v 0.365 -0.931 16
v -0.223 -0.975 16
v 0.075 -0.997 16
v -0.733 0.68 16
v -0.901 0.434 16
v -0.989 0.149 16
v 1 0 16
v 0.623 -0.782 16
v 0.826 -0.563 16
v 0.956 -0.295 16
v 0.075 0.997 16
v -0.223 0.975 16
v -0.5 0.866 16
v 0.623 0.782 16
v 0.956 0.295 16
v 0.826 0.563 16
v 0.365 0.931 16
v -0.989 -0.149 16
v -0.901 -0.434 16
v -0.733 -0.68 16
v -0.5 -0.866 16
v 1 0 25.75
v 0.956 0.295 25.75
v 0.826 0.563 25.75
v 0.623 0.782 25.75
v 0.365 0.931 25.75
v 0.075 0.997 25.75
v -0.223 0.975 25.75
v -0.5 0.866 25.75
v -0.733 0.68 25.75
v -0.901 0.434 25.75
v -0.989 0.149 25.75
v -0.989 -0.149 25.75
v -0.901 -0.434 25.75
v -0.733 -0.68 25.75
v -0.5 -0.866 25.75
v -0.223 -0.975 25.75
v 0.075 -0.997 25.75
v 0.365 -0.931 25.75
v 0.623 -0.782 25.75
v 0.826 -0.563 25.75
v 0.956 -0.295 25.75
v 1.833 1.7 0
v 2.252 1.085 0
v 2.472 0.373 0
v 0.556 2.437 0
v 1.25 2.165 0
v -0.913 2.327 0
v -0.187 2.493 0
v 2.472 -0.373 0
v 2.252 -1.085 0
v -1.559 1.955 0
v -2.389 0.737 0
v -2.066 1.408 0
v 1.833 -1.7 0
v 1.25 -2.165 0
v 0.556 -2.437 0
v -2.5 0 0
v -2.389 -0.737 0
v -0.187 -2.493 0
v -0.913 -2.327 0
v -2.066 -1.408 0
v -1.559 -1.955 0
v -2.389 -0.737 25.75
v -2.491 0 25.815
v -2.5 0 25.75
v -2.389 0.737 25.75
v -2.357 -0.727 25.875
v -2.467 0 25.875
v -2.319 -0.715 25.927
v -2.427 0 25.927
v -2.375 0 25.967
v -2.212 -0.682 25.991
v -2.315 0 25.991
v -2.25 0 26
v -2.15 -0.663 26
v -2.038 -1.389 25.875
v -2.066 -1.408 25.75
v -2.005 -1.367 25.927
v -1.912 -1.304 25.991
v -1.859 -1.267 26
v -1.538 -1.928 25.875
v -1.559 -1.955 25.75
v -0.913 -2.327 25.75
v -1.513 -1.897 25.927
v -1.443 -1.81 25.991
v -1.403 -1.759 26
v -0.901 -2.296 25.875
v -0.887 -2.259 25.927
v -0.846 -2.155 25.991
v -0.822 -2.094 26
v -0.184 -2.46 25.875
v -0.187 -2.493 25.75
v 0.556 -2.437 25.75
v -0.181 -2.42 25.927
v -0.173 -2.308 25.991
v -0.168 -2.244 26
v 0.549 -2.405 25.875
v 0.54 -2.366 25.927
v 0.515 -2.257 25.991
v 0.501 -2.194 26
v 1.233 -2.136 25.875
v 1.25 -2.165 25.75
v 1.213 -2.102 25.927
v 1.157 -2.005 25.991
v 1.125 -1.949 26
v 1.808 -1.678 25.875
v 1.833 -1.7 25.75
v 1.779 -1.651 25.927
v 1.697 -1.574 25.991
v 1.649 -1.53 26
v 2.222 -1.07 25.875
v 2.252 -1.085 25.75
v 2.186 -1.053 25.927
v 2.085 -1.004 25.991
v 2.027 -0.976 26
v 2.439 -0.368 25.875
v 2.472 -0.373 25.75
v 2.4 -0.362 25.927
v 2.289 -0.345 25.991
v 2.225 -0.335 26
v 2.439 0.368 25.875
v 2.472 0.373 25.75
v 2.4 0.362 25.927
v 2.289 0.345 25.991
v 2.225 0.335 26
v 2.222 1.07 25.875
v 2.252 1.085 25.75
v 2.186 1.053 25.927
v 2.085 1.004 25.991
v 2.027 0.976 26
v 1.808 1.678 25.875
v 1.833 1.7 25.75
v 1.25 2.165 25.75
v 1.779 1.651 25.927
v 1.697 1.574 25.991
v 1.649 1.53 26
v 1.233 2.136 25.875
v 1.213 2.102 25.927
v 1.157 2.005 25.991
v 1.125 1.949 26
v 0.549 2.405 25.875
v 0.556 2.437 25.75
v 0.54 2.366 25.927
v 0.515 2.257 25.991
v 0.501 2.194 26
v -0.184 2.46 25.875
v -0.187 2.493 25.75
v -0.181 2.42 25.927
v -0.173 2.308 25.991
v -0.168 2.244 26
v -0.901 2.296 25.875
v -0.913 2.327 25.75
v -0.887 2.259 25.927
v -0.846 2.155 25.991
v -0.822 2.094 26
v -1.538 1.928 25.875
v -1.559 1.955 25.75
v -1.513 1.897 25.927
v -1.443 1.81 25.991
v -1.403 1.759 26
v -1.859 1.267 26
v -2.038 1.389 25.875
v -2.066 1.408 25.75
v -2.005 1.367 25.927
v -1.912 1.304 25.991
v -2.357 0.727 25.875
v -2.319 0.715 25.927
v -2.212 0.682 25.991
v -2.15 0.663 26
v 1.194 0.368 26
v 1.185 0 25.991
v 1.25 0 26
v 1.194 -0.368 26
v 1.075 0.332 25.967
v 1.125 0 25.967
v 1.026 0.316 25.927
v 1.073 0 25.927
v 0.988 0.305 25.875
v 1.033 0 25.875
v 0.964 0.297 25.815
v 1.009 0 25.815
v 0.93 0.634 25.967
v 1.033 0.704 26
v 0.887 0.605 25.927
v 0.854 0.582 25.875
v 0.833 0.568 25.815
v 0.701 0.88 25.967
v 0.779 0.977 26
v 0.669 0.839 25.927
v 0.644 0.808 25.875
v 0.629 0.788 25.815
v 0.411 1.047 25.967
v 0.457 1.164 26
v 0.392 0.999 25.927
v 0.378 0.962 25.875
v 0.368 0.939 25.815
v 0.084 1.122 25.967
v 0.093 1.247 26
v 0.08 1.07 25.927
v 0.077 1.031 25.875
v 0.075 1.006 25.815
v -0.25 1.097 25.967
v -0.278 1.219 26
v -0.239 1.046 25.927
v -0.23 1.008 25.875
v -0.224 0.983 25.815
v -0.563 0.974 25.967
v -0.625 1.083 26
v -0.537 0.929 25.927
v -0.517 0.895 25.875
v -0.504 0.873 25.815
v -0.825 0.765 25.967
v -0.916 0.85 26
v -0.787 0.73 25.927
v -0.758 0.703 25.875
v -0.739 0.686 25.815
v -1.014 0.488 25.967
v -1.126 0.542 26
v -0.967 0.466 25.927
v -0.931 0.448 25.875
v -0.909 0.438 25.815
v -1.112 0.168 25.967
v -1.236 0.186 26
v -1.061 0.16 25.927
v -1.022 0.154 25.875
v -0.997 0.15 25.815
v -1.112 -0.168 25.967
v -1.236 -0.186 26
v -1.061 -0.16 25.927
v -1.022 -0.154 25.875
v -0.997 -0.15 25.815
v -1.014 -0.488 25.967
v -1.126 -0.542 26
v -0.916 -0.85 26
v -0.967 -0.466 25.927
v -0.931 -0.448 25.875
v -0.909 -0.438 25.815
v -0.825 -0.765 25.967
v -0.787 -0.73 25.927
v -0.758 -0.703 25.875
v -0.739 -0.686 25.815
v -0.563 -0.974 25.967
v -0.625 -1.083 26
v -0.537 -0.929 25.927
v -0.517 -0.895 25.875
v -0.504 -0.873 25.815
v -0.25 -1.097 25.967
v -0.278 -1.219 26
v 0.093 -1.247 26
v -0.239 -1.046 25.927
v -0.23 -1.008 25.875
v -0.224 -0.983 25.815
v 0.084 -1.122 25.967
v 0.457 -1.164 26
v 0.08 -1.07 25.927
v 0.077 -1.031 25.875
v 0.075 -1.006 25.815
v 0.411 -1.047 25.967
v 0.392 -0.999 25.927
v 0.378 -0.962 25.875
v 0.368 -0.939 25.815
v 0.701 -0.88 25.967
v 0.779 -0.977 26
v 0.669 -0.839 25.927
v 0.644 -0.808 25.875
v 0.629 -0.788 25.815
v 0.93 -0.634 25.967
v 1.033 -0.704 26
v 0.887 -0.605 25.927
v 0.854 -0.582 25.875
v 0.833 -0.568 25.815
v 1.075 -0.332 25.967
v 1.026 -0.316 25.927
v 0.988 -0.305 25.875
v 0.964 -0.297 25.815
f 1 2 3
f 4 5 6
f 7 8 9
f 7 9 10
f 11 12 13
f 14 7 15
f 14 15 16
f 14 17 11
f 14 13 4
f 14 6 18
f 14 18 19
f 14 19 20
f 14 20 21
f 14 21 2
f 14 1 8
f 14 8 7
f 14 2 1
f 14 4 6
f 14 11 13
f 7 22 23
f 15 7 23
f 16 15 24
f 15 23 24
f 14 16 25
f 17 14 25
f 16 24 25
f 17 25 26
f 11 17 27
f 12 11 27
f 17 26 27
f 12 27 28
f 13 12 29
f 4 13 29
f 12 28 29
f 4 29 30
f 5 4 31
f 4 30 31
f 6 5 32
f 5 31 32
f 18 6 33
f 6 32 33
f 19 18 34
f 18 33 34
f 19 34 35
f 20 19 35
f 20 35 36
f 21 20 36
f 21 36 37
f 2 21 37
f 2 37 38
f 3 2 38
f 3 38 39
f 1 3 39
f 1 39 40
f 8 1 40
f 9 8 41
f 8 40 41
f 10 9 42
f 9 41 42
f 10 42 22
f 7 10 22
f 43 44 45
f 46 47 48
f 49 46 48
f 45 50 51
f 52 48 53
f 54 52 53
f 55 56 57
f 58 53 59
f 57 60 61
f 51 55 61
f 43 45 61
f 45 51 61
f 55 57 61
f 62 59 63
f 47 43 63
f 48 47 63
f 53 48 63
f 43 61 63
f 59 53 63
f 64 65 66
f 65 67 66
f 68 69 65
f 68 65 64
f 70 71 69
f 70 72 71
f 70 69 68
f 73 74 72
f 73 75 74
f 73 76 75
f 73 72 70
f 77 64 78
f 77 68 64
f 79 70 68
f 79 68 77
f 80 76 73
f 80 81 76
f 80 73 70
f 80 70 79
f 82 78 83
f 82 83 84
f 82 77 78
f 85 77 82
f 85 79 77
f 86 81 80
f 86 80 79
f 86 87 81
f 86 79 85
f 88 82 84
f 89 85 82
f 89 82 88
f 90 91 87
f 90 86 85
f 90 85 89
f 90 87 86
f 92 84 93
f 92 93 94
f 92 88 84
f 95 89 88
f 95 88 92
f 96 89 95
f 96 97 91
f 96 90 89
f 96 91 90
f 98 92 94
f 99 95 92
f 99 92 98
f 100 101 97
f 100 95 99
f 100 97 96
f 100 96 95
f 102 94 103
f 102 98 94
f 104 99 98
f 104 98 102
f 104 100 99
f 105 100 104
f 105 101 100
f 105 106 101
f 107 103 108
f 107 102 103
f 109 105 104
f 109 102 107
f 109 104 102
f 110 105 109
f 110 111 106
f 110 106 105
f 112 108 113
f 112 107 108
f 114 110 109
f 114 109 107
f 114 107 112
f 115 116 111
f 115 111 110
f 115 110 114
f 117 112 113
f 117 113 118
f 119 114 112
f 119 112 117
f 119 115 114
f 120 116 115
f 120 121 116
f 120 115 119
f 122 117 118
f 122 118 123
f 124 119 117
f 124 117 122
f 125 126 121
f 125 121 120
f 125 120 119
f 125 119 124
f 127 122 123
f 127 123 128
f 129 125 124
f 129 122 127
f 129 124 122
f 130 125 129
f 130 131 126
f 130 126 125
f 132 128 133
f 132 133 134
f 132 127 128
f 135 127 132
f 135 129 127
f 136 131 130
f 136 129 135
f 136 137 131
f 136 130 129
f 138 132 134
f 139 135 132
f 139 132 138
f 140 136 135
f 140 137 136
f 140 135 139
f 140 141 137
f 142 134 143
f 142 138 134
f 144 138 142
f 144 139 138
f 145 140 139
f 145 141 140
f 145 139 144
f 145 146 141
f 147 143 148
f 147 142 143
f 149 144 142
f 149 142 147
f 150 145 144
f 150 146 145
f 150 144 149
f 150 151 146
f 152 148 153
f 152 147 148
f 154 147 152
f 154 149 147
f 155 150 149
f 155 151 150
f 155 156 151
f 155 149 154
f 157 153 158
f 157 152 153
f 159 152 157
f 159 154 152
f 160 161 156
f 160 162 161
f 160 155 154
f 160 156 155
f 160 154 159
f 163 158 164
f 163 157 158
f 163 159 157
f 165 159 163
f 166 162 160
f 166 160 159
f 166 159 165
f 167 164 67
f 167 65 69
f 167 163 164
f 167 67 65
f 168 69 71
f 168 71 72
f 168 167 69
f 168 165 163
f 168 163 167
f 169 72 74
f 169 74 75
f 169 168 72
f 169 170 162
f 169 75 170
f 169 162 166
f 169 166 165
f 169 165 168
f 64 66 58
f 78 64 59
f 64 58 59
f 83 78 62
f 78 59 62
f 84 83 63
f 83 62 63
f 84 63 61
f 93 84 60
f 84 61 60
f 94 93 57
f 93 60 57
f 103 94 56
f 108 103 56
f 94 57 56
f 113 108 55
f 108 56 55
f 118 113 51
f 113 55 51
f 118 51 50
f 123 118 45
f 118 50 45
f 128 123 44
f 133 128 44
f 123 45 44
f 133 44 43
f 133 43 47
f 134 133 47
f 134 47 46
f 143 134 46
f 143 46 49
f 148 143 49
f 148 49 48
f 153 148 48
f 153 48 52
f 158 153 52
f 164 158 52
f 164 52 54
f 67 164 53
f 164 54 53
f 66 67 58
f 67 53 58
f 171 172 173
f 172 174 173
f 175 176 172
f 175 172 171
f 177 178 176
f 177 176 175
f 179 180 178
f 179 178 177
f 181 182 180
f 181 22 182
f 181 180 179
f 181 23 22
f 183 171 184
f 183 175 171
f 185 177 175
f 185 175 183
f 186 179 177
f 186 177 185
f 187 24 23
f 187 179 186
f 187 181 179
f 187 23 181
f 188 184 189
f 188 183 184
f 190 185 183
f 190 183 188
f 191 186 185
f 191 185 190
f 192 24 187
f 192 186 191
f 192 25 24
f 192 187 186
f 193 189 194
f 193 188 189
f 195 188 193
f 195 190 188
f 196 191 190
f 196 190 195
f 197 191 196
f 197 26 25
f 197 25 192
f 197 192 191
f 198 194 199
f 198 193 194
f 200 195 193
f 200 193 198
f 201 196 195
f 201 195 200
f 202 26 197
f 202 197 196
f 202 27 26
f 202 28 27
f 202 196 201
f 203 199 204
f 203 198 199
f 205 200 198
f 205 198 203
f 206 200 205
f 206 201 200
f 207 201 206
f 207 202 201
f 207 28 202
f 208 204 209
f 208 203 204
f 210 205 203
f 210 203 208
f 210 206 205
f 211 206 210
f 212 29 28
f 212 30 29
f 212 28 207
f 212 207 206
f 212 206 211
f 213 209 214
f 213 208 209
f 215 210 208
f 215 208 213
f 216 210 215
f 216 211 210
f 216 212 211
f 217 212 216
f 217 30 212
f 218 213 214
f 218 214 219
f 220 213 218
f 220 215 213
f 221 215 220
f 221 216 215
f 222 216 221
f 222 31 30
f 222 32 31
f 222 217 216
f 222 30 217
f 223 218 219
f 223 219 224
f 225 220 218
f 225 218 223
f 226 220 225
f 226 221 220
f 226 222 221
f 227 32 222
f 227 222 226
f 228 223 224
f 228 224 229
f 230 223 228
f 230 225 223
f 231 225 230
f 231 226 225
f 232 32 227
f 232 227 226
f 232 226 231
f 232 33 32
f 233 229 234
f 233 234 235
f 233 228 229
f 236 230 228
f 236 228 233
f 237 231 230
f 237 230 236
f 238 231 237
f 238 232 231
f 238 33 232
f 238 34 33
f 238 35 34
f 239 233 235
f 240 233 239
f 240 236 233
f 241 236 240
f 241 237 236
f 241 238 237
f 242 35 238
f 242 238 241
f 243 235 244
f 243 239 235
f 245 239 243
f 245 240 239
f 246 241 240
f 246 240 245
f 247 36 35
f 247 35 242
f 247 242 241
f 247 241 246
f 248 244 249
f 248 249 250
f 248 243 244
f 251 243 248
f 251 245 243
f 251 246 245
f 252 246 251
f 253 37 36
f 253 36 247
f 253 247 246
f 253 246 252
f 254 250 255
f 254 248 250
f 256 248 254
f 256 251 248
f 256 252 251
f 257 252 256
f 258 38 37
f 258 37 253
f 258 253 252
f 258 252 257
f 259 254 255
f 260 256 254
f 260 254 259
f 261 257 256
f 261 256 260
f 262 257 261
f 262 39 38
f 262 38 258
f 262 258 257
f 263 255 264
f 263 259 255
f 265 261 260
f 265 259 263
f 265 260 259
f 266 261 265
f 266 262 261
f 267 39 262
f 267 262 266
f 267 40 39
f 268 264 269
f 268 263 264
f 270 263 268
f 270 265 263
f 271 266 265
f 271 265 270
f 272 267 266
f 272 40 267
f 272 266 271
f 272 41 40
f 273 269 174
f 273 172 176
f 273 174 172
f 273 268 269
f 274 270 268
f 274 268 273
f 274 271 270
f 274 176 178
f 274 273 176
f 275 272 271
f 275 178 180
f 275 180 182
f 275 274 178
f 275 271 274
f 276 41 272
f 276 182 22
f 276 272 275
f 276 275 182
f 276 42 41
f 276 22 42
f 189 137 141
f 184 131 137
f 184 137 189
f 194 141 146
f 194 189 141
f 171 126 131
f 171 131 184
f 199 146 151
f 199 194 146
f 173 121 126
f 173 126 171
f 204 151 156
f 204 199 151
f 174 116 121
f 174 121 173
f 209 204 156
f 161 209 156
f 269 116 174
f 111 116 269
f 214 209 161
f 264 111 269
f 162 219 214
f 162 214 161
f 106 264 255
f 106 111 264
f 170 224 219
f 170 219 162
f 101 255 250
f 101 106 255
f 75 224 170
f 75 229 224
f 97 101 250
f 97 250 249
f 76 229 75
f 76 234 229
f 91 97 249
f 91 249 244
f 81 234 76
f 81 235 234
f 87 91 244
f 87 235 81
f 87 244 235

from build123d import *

# Parameters (mm, degrees)
CROQUIS1_R              = 2.5
SALIENTE_EXTRUIR1_DEPTH = 26
CROQUIS2_R              = 1
CORTAR_EXTRUIR1_DEPTH   = 10
REDONDEO1_R             = 0.25


with BuildPart() as part:
    # Croquis1 → Saliente-Extruir1 (new body)
    with BuildSketch(Plane.XY):
        with Locations(Location((0, 0, 0), (0, 0, 180))):
            Circle(CROQUIS1_R)
    extrude(amount=SALIENTE_EXTRUIR1_DEPTH)

    # Croquis2 → Cortar-Extruir1 (cut)
    with BuildSketch(Plane.XY.offset(26)):
        Circle(CROQUIS2_R)
    extrude(amount=-CORTAR_EXTRUIR1_DEPTH, mode=Mode.SUBTRACT)

    # Redondeo1
    redondeo1_edges = [part.edges().sort_by_distance(p)[0] for p in [
        (2.5, 0, 26),
        (-1, 0, 26),
    ]]
    fillet(redondeo1_edges, radius=REDONDEO1_R)


solid = part.part
